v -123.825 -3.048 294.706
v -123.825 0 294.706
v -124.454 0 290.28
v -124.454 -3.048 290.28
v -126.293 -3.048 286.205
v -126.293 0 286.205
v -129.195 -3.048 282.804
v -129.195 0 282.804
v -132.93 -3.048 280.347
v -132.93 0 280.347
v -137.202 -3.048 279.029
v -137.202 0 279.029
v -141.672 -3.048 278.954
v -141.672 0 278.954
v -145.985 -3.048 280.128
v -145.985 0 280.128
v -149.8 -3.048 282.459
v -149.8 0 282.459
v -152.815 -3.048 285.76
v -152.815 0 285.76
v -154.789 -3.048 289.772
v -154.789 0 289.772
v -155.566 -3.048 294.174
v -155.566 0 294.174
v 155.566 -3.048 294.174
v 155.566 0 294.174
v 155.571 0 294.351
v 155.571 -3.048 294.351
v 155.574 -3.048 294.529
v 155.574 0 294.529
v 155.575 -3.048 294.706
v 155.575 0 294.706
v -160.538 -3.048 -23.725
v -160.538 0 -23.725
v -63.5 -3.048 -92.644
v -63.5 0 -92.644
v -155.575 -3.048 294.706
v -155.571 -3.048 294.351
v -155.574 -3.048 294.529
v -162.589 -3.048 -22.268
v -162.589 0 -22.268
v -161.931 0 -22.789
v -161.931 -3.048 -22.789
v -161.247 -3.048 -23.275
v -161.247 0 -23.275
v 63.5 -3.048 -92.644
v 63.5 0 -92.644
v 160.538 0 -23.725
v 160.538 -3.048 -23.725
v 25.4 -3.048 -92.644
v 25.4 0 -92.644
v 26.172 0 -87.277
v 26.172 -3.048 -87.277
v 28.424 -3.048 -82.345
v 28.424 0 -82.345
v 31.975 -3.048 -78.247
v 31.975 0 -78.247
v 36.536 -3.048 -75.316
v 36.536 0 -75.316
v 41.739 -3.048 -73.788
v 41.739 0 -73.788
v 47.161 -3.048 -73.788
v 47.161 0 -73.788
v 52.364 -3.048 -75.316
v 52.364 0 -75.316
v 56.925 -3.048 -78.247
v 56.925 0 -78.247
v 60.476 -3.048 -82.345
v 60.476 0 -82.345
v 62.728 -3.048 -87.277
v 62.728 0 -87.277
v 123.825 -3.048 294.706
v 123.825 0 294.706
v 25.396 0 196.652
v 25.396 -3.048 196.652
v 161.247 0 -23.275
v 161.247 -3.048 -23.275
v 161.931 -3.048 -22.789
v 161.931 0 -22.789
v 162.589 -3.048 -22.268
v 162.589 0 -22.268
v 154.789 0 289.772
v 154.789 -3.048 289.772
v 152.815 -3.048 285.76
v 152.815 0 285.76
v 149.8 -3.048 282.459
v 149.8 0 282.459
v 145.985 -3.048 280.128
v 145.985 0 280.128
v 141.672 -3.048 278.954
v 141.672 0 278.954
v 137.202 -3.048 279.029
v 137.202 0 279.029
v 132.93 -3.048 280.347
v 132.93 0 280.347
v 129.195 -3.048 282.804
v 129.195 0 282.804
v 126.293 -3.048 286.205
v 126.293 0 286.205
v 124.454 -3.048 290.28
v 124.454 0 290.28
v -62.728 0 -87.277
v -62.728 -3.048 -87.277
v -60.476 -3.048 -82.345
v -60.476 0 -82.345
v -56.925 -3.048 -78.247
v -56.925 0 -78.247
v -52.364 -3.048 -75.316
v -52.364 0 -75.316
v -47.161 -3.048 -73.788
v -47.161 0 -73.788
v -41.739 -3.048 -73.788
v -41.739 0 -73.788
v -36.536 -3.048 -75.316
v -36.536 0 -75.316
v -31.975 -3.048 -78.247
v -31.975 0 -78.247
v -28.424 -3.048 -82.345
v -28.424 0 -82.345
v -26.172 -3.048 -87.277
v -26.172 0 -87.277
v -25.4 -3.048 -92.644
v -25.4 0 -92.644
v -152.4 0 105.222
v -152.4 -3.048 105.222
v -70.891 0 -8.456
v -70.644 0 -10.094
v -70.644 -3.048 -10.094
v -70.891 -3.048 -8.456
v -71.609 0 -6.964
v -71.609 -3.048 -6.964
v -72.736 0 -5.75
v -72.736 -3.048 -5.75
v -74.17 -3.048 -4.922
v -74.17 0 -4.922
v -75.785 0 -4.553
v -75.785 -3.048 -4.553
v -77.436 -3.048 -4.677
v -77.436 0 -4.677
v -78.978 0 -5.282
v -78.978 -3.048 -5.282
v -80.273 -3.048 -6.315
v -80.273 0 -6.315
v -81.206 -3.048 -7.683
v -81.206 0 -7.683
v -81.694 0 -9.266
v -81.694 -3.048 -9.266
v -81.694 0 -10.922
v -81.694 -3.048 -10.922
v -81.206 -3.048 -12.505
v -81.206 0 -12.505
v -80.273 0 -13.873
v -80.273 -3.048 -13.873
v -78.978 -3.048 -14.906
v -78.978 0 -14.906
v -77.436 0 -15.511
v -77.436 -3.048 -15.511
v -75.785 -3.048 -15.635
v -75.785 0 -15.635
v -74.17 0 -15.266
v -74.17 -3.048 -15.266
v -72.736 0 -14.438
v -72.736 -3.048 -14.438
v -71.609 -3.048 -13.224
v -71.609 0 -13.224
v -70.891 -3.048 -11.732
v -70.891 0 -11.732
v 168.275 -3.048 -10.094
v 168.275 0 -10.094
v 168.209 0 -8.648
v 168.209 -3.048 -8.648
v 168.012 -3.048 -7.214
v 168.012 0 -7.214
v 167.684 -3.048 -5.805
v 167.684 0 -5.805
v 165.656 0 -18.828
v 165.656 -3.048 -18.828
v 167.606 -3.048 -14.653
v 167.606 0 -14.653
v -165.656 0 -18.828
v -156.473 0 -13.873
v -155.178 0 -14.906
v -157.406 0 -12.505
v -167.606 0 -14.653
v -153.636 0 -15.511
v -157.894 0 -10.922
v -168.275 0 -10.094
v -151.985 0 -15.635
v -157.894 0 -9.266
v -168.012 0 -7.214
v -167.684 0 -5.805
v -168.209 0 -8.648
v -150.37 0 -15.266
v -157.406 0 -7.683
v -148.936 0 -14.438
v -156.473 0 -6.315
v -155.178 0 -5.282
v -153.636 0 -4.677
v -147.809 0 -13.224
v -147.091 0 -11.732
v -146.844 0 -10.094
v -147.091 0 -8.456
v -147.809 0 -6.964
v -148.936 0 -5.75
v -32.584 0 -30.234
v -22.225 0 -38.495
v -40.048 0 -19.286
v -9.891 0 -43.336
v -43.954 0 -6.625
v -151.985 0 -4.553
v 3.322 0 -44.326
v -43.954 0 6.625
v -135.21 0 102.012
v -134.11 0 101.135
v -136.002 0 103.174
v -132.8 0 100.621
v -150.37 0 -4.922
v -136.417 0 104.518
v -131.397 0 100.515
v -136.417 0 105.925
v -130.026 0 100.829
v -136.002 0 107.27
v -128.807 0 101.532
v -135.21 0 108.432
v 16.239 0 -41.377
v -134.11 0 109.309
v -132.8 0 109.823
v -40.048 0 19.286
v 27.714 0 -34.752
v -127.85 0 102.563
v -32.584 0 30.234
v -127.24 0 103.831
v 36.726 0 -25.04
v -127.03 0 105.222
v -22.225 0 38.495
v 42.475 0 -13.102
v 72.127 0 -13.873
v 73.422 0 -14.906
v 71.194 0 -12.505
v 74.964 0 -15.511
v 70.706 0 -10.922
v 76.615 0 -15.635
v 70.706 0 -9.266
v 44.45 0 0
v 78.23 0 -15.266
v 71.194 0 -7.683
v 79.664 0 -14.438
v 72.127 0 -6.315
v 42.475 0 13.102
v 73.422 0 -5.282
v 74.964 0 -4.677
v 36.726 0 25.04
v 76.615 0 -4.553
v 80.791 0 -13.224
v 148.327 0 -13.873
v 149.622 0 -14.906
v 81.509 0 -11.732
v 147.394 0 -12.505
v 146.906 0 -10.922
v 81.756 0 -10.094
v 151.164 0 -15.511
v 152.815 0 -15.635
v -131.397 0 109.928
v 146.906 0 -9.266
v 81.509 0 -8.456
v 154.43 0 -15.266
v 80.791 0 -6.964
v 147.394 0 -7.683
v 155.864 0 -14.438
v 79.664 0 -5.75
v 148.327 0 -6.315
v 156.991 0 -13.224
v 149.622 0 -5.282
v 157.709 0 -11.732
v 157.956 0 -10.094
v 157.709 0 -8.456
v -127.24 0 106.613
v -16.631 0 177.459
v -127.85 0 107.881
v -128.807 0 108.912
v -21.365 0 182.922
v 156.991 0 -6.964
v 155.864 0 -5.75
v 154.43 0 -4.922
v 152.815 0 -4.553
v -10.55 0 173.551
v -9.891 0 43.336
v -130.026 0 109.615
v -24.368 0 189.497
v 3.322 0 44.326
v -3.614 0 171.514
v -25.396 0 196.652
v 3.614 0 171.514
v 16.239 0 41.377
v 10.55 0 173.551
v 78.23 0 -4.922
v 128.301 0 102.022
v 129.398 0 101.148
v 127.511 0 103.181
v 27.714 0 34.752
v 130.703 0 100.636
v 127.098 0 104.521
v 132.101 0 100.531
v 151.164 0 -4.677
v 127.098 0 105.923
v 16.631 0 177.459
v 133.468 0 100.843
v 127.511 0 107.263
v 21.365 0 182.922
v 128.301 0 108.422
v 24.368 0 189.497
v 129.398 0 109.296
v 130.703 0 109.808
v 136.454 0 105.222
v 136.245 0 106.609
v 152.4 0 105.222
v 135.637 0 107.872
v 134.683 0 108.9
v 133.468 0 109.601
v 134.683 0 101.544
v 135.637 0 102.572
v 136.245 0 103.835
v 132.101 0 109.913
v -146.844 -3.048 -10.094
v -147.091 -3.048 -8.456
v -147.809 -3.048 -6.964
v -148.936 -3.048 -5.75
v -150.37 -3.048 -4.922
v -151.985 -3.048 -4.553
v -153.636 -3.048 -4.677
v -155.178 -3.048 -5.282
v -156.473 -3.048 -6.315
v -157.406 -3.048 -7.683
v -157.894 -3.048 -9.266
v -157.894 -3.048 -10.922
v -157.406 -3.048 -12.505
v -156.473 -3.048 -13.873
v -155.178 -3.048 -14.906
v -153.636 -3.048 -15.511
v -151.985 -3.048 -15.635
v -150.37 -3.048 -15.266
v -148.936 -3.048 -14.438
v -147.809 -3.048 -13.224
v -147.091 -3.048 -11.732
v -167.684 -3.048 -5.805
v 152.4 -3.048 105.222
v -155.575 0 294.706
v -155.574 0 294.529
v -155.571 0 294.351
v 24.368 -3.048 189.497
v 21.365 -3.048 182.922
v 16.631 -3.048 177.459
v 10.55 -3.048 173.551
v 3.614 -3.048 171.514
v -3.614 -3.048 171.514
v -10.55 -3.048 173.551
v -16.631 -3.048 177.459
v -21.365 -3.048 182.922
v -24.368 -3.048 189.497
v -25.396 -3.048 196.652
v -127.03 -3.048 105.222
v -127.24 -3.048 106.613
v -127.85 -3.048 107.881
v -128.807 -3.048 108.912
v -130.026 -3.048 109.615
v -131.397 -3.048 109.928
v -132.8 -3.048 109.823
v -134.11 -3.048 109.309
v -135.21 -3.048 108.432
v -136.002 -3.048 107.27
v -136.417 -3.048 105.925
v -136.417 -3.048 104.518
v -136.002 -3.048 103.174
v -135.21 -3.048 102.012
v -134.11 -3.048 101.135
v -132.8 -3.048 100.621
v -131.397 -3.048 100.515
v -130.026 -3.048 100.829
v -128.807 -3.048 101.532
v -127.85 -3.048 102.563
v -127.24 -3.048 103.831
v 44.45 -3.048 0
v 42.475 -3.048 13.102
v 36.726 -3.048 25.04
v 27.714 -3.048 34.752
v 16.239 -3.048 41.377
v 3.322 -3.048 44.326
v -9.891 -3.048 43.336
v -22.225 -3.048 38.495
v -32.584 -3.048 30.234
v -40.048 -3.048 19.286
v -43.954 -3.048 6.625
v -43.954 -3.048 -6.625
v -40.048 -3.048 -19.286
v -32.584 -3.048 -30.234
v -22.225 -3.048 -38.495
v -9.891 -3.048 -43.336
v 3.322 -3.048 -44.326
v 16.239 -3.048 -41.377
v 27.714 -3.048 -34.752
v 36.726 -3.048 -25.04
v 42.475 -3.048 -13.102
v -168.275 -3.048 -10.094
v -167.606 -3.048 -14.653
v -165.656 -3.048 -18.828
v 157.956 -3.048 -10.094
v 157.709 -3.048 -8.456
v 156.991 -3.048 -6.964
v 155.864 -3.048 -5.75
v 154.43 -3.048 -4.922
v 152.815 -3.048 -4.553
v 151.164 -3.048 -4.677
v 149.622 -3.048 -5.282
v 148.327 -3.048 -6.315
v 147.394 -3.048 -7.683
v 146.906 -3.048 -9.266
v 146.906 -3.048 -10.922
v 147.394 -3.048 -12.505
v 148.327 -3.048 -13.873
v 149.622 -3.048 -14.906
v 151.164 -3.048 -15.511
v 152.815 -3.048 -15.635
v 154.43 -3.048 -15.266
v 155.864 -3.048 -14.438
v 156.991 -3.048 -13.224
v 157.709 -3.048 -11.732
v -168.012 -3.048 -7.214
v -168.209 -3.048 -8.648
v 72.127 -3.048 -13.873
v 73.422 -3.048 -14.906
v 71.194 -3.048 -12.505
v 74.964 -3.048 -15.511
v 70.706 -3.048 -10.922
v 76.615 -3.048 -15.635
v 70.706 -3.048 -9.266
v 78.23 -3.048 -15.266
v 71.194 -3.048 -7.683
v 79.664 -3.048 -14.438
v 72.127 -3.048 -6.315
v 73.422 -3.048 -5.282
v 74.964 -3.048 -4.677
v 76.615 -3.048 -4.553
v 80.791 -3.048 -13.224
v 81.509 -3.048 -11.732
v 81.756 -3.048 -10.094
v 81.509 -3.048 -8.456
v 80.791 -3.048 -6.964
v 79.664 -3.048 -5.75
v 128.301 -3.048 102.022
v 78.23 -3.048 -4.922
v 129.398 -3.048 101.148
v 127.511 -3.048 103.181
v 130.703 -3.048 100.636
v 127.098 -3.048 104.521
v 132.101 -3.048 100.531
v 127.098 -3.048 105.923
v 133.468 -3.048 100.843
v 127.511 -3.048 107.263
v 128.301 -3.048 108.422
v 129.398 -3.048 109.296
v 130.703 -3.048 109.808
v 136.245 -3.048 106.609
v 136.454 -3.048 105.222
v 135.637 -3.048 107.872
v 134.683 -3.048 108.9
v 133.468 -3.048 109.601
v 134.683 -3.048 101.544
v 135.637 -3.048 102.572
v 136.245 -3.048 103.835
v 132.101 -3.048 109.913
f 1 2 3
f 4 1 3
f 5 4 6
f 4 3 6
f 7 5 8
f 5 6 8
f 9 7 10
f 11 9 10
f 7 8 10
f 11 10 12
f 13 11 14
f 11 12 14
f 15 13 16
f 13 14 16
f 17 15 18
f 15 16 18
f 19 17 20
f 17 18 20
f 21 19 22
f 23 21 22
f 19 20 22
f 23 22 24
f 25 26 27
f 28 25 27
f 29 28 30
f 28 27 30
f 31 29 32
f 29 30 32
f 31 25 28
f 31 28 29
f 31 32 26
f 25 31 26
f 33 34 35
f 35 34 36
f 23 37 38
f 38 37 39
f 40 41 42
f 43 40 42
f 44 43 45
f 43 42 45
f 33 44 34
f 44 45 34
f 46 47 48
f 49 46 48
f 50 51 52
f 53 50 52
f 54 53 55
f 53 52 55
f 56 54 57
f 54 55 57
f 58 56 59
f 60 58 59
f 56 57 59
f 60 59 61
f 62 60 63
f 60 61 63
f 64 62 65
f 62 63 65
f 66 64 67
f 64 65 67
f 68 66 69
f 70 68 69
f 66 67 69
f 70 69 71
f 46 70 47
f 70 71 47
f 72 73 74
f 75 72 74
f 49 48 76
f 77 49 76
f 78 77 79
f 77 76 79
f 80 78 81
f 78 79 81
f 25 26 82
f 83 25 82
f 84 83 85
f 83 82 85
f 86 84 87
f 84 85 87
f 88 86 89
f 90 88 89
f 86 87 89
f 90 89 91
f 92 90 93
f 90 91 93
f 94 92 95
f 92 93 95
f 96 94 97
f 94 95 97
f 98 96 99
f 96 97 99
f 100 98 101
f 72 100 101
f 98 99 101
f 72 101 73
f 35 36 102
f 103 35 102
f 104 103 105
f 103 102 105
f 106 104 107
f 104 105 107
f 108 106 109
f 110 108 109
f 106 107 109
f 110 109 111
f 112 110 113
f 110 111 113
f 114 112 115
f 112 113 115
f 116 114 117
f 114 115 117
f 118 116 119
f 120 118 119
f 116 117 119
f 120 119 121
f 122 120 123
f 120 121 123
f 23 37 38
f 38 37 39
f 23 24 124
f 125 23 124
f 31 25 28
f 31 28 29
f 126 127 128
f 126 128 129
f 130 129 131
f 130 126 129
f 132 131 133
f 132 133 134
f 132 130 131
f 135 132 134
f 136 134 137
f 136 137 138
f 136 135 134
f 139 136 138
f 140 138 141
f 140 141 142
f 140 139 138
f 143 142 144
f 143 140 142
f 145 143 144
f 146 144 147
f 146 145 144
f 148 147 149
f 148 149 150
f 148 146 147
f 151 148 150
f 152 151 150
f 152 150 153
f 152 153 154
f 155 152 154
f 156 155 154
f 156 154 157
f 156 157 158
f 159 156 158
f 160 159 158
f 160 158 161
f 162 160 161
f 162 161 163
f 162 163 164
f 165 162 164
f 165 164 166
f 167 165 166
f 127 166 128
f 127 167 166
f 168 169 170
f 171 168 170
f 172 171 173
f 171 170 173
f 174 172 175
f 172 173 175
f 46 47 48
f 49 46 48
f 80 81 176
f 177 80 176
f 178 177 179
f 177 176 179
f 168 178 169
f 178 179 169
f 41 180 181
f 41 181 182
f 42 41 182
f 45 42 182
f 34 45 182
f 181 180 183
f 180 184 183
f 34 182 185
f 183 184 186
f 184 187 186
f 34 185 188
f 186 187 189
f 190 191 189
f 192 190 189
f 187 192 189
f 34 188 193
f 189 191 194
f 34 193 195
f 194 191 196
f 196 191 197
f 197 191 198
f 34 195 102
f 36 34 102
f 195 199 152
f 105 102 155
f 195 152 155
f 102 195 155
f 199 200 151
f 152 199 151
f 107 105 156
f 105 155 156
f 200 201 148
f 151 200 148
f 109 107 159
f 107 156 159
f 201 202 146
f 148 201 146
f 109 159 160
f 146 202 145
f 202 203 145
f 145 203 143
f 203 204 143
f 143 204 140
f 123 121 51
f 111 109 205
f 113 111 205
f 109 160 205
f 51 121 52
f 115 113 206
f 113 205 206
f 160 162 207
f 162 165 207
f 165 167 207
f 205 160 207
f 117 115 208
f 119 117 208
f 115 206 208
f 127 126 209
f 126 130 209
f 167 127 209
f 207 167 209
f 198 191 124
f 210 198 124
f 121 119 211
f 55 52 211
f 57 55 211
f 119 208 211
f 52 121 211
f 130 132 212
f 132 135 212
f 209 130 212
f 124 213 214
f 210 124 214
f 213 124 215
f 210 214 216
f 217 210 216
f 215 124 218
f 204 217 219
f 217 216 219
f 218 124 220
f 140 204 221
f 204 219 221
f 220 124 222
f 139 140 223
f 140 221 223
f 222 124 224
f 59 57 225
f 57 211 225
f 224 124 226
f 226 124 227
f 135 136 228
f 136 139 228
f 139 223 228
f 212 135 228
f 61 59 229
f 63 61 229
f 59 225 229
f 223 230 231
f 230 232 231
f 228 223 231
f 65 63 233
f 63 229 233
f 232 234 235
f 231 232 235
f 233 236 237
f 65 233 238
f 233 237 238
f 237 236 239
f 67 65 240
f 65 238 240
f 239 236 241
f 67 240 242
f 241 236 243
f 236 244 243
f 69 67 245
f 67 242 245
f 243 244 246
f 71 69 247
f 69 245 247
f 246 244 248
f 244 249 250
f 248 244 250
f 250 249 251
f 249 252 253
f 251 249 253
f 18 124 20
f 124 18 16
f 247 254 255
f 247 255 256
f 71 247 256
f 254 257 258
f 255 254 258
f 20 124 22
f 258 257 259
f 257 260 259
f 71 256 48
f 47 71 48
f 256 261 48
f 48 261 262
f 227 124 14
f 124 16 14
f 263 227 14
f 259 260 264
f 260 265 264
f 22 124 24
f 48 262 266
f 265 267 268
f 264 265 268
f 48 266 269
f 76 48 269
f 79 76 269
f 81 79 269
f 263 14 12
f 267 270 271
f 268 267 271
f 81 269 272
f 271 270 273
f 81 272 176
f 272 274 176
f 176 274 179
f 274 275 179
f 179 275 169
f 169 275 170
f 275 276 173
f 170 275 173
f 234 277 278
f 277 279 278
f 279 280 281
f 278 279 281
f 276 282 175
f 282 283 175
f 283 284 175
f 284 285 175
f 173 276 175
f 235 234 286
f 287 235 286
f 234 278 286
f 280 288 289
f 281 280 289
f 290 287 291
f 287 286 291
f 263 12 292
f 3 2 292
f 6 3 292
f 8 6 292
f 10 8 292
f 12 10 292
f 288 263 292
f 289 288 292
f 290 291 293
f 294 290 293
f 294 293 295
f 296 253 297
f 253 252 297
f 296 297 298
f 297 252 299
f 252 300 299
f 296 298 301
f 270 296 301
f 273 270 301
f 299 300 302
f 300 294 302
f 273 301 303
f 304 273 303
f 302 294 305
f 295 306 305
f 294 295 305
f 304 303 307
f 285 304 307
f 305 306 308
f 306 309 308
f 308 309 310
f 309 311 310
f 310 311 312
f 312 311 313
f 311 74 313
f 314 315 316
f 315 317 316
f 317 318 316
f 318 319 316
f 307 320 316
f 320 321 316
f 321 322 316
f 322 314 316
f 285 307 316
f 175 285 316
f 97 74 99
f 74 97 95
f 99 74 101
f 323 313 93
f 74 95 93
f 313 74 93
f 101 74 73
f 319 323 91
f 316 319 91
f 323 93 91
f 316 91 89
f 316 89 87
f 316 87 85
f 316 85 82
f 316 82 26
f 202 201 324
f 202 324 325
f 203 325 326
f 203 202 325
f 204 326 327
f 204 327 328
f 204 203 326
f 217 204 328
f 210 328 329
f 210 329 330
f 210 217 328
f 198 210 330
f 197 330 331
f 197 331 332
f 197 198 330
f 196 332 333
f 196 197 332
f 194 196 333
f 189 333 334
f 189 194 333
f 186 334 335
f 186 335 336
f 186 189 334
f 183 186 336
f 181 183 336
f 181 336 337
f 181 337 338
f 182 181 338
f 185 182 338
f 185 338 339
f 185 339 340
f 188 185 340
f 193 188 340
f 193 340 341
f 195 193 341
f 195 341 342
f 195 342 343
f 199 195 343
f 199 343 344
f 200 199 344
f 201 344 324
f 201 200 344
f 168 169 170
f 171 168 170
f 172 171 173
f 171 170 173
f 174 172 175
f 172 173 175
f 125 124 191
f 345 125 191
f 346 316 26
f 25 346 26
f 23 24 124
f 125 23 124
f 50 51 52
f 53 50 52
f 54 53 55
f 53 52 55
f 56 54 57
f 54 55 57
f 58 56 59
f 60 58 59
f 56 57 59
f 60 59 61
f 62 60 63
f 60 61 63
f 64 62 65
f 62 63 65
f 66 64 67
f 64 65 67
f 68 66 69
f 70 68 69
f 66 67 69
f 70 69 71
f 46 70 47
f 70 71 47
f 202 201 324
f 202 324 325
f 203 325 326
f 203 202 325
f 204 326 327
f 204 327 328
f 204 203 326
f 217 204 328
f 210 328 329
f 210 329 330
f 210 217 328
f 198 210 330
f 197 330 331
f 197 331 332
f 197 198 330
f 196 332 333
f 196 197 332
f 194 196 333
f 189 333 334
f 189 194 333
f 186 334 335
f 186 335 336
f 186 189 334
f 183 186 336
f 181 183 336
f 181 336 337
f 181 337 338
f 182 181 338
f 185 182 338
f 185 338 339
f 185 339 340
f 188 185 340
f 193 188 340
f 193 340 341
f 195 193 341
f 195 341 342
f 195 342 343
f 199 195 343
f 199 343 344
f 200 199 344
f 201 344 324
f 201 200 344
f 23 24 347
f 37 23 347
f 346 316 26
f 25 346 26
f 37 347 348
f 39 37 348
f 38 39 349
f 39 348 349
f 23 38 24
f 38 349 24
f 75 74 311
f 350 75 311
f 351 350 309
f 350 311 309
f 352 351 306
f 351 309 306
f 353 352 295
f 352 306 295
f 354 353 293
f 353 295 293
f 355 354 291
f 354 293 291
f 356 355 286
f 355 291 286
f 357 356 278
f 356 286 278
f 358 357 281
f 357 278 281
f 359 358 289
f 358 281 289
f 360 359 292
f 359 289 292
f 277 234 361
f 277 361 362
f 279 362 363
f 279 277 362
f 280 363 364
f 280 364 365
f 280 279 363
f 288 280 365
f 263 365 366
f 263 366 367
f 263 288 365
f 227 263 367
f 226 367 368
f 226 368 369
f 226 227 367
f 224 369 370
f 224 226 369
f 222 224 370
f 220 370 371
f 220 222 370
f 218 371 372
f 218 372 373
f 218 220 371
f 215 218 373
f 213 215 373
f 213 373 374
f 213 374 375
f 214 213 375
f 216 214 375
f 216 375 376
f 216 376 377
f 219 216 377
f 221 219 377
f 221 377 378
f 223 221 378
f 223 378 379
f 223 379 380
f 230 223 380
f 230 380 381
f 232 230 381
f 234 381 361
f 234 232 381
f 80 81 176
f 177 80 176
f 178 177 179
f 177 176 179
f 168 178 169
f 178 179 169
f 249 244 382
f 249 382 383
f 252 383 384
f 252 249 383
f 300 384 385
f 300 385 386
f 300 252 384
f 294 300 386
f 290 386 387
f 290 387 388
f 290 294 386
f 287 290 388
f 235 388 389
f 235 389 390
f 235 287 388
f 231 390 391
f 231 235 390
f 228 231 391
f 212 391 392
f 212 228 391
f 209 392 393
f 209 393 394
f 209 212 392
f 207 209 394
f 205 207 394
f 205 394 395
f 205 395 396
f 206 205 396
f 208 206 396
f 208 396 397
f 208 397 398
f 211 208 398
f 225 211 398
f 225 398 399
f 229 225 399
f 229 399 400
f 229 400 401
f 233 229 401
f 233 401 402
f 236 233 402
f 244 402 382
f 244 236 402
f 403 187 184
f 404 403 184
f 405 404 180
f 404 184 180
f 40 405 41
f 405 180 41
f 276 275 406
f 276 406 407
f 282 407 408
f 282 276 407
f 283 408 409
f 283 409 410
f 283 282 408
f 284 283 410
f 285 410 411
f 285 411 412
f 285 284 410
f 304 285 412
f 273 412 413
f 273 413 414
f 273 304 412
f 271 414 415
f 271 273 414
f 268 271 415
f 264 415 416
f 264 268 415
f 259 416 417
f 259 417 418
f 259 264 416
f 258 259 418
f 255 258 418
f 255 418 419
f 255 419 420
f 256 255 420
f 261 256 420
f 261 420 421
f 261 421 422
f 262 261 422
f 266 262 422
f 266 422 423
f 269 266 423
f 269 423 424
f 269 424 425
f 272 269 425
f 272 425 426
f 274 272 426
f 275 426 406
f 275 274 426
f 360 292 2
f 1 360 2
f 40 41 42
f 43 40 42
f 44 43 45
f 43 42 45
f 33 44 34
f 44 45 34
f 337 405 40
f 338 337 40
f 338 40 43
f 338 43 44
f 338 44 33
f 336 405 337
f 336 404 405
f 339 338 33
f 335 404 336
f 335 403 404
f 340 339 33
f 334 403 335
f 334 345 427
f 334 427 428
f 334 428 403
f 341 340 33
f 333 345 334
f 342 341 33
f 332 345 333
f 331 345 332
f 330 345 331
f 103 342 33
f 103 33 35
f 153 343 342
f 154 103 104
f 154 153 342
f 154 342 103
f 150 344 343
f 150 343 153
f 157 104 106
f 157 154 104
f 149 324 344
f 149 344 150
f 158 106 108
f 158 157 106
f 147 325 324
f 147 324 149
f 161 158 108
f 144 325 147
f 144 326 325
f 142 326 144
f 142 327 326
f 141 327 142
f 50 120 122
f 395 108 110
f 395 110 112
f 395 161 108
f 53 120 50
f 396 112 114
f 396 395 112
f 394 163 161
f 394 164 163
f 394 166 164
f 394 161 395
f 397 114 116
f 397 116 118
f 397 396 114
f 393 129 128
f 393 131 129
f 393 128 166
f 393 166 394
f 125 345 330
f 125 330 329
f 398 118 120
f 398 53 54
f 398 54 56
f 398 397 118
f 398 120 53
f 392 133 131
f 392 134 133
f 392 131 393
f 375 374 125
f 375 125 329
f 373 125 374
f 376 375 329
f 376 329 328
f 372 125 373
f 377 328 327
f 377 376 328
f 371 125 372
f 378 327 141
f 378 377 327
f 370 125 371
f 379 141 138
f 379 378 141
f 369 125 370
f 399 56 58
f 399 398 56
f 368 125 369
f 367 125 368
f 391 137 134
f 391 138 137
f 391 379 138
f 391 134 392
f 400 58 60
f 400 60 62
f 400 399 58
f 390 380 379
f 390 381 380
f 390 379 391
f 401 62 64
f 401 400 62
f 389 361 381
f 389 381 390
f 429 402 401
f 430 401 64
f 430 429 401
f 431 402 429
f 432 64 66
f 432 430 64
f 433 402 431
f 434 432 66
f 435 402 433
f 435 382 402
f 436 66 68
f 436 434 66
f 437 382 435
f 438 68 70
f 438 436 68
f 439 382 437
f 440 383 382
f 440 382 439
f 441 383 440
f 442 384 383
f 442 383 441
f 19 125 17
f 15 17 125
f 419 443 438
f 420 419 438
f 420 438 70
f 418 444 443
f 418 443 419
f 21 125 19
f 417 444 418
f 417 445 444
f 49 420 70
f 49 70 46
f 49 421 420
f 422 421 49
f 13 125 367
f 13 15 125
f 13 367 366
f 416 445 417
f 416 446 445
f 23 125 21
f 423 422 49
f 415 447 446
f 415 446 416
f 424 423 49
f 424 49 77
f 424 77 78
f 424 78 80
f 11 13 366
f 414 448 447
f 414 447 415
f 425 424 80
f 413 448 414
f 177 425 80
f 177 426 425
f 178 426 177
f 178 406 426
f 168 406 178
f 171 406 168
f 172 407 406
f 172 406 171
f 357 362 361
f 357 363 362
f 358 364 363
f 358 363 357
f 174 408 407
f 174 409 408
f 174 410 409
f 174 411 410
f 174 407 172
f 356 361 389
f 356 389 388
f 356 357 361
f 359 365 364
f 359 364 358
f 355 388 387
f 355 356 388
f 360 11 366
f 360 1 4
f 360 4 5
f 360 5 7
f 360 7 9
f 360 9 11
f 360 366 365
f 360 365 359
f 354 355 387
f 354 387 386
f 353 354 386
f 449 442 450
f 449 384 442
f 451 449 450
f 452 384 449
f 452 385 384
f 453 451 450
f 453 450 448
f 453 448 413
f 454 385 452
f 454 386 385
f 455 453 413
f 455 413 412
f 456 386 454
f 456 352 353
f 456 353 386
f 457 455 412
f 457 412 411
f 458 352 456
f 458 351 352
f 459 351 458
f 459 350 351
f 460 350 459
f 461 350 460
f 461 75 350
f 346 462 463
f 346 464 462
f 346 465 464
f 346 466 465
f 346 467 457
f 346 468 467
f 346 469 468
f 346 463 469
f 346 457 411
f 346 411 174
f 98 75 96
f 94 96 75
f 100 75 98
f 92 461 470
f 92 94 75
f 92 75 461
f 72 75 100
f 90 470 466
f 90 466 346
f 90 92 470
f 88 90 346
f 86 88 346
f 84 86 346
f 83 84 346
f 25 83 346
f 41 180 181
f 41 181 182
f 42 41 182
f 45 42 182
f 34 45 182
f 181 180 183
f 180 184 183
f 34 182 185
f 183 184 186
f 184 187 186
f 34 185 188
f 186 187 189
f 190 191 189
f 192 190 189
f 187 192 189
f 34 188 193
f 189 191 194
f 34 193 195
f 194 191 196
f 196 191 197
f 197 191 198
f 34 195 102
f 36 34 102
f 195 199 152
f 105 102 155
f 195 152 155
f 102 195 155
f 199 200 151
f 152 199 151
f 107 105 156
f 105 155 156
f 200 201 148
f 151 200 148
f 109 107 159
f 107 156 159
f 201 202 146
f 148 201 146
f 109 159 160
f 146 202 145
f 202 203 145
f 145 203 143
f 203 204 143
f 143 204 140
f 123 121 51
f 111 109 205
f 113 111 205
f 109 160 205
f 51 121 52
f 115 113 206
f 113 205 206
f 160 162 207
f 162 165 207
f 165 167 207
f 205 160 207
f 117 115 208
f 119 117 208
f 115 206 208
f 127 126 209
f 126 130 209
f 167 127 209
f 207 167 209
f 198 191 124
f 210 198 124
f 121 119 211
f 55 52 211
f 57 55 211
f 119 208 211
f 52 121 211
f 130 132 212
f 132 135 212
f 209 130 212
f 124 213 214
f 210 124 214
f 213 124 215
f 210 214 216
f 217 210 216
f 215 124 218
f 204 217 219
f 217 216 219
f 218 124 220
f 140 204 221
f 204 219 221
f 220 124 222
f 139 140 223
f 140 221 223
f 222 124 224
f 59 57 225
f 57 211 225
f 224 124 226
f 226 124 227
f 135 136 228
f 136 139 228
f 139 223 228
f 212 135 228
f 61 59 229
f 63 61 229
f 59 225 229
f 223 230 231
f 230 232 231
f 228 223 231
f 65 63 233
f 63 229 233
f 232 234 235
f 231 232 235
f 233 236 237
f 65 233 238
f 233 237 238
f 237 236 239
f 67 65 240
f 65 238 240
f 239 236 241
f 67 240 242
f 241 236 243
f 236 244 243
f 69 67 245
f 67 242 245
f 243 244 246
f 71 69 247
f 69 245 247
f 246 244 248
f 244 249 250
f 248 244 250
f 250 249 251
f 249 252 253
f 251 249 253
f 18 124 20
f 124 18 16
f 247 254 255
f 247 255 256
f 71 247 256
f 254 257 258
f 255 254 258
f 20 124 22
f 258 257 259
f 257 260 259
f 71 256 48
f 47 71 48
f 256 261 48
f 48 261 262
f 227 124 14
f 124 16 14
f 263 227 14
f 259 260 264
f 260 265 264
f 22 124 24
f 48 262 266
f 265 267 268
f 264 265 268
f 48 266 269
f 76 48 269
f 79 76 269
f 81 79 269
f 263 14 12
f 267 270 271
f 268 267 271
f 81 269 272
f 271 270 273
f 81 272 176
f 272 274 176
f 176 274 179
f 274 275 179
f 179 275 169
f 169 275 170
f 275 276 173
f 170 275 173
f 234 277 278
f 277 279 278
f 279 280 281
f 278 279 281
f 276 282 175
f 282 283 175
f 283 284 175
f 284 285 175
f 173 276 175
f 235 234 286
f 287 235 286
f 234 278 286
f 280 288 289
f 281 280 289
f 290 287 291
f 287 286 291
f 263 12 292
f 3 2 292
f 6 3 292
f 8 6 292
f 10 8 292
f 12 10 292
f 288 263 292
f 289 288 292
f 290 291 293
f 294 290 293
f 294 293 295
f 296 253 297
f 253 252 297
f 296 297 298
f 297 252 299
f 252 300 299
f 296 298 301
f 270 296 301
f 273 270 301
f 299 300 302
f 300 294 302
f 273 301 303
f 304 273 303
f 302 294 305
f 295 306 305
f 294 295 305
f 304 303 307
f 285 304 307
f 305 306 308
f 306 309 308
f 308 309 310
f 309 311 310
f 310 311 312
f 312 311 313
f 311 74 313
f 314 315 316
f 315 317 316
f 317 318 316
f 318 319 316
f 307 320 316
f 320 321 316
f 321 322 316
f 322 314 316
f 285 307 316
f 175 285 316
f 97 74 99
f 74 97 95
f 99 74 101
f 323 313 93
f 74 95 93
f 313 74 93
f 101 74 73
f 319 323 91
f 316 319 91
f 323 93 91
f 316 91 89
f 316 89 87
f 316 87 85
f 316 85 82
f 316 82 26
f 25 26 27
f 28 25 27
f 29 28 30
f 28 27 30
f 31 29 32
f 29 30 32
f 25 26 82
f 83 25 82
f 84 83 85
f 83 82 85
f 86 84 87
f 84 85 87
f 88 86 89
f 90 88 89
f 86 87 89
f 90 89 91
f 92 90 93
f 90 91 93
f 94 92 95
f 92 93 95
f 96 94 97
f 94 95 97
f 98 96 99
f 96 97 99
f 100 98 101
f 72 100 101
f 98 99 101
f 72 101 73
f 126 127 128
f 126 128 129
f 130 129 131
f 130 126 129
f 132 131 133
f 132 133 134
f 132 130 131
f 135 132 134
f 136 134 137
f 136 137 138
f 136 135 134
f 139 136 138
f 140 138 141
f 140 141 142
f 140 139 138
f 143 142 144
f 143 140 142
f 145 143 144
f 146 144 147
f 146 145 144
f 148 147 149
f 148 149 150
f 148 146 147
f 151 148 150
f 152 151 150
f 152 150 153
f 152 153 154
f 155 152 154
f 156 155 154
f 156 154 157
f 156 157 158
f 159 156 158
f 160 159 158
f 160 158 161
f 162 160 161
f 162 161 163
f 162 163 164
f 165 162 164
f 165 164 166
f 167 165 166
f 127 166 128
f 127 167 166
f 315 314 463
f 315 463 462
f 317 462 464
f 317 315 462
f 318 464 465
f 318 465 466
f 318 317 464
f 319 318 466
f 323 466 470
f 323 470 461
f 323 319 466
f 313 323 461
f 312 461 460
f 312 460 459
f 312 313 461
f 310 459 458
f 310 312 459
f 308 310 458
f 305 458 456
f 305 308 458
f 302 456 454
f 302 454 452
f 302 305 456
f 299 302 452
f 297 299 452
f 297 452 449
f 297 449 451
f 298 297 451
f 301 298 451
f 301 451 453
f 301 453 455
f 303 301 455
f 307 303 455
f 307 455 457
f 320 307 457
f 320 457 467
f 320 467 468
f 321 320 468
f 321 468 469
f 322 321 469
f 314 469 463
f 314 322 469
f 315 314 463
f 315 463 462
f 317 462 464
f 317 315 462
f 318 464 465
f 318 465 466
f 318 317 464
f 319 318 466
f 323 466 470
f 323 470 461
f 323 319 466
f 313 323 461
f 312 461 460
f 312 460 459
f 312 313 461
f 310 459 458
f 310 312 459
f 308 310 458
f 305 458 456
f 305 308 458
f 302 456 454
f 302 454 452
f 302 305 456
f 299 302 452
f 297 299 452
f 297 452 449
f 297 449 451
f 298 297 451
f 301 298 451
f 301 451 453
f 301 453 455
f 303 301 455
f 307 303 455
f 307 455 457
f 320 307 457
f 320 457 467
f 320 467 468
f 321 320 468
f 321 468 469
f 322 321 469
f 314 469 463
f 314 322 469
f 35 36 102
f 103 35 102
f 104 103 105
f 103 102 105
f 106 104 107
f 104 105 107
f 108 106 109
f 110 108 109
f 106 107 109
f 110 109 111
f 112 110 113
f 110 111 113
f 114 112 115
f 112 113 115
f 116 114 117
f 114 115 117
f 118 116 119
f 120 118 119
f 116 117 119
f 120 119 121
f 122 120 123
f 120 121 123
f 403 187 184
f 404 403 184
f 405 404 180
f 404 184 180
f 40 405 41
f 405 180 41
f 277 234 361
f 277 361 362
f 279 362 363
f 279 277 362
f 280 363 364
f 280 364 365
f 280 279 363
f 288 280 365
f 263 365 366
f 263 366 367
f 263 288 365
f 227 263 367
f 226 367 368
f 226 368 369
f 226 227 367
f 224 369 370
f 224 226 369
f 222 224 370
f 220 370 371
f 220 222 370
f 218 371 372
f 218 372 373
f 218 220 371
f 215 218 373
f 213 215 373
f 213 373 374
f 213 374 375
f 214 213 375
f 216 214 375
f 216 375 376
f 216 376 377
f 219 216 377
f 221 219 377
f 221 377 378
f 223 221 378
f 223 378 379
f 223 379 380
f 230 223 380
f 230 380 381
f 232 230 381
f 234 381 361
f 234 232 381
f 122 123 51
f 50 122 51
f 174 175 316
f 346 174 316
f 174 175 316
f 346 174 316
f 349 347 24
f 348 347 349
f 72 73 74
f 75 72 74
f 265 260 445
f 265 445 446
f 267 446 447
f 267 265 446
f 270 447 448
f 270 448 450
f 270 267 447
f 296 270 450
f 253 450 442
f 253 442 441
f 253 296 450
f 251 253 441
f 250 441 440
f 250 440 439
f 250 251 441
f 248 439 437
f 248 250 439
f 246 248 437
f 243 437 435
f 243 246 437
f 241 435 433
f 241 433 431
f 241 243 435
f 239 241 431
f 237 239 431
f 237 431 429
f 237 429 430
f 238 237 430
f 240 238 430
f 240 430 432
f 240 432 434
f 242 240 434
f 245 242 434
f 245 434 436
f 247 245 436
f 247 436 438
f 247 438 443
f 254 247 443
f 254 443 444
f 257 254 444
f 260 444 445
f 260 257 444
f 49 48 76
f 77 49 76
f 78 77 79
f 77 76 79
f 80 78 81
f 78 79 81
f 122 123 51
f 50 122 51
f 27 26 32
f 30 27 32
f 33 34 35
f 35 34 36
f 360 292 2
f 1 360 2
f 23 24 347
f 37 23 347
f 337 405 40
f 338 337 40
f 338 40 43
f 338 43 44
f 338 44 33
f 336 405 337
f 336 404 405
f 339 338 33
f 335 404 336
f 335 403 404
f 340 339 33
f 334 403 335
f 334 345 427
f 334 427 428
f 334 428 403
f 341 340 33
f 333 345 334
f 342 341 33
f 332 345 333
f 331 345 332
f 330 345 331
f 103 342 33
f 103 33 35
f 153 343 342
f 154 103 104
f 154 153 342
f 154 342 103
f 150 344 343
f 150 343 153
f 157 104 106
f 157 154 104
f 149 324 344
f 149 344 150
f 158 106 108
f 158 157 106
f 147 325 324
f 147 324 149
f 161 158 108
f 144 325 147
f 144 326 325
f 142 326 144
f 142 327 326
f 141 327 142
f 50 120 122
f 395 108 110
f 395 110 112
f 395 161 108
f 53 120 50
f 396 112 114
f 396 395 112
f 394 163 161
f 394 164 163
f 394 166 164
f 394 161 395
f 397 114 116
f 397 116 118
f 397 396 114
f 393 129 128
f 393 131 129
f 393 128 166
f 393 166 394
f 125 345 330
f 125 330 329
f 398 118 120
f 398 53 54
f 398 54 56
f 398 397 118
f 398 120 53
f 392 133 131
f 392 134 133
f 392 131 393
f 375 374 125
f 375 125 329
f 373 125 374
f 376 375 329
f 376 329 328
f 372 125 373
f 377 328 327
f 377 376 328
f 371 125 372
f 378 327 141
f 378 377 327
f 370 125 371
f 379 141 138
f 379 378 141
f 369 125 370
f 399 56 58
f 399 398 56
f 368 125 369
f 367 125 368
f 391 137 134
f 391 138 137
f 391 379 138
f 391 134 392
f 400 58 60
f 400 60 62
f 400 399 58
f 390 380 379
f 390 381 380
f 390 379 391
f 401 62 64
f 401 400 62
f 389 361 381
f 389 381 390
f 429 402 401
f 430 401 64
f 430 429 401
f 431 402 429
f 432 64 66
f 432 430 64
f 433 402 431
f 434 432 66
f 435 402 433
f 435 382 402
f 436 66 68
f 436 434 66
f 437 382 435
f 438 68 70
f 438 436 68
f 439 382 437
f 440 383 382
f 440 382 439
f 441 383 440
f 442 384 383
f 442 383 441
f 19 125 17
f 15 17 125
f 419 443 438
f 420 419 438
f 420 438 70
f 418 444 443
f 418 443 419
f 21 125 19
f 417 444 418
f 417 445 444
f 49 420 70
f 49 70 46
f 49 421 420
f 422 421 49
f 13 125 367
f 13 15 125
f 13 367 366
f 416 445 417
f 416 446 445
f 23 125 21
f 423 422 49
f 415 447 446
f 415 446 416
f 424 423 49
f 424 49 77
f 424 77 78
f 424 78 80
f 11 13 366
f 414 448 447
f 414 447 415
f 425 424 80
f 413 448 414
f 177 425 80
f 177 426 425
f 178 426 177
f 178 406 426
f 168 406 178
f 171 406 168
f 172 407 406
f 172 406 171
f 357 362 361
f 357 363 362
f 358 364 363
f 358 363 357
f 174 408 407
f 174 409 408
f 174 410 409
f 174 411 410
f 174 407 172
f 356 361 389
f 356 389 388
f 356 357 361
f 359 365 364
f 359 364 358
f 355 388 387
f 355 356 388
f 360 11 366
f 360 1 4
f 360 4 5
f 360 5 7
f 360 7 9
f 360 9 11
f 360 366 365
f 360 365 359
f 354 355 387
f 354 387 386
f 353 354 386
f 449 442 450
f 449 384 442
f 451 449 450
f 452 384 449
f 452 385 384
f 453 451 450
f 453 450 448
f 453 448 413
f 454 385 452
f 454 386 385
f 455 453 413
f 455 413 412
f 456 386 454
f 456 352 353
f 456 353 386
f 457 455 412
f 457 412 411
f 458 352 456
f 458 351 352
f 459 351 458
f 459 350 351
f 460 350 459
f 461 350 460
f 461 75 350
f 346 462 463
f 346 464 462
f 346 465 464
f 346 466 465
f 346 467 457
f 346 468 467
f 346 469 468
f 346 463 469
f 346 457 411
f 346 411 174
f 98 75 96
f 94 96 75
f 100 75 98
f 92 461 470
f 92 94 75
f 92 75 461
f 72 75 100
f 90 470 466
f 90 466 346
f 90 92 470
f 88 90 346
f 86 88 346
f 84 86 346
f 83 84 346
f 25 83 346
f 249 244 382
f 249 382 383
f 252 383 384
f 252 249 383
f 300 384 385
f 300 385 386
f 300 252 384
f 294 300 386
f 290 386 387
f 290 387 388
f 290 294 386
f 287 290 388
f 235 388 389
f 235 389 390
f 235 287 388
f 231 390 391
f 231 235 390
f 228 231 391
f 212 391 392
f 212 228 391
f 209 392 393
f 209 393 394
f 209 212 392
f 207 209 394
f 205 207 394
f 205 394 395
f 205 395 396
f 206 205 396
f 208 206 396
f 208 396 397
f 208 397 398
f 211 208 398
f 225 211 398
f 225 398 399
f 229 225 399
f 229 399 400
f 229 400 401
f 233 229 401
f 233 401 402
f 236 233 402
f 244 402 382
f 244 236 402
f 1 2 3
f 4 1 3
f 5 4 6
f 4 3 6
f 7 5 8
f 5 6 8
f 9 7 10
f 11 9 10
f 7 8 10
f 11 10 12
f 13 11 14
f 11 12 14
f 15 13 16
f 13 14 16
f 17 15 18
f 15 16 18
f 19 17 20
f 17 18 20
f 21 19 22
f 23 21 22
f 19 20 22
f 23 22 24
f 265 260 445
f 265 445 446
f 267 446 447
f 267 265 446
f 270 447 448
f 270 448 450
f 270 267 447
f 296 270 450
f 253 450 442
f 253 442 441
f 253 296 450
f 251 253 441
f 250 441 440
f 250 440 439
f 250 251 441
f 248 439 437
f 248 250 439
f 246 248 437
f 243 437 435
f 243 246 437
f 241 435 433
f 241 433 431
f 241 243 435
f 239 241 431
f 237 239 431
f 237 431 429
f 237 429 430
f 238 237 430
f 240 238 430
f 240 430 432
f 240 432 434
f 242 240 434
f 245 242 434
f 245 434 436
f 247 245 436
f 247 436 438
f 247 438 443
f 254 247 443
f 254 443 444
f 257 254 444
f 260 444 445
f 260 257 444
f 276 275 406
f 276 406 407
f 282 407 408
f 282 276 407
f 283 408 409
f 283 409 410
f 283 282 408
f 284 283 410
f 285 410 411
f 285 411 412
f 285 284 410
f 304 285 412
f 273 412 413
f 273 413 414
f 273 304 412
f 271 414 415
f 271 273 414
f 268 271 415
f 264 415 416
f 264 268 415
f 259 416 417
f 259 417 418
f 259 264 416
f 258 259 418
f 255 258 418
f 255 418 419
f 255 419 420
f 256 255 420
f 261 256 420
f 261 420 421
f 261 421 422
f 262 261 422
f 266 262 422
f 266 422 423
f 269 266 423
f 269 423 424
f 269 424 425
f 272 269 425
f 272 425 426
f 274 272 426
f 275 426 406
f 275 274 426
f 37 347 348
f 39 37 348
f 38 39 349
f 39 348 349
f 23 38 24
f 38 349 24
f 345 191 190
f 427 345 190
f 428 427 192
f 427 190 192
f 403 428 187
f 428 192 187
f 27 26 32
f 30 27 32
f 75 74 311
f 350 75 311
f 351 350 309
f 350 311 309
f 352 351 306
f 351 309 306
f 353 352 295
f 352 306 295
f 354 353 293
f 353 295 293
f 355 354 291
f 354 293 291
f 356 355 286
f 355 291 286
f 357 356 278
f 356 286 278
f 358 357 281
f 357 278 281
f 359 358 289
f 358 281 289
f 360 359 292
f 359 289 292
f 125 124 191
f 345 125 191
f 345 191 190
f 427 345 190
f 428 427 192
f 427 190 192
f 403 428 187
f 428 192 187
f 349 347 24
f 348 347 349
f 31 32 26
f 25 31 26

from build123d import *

# Parameters (mm, degrees)
F0_R     = 5.55625
F0_R_2   = 44.45
F0_R_3   = 4.719662
F0_R_4   = 4.704253
F1_DEPTH = 3.048
F2_DEPTH = 3.048


with BuildPart() as f1:
    # F0 (on Front) → F1 (new body)
    with BuildSketch(Plane.XZ):
        with BuildLine():
            ThreePointArc((-155.575, 294.705913), (-155.572772, 294.439949), (-155.566088, 294.174059))
            Line((-155.566088, 294.174059), (-155.575, 294.705913))
        make_face()
        with BuildLine():
            Line((155.575, 294.705913), (155.566088, 294.174059))
            ThreePointArc((155.566088, 294.174059), (155.572772, 294.439949), (155.575, 294.705913))
        make_face()
        with BuildLine():
            ThreePointArc((-63.5, -92.644087), (-44.45, -73.594087), (-25.4, -92.644087))
            Line((-25.4, -92.644087), (25.4, -92.644087))
            ThreePointArc((25.4, -92.644087), (44.45, -73.594087), (63.5, -92.644087))
            Line((63.5, -92.644087), (160.537703, -23.724692))
            Line((160.537703, -23.724692), (162.58925, -22.267616))
            ThreePointArc((162.58925, -22.267616), (166.783497, -16.812021), (168.275, -10.094087))
            Line((168.275, -10.094087), (167.684475, -5.804511))
            Line((167.684475, -5.804511), (152.4, 105.221913))
            Line((152.4, 105.221913), (155.566088, 294.174059))
            ThreePointArc((155.566088, 294.174059), (139.434035, 278.833141), (123.825, 294.705913))
            Line((123.825, 294.705913), (25.396428, 196.652323))
            ThreePointArc((25.396428, 196.652323), (0, 171.255895), (-25.396428, 196.652323))
            Line((-25.396428, 196.652323), (-123.825, 294.705913))
            ThreePointArc((-123.825, 294.705913), (-139.434035, 278.833141), (-155.566088, 294.174059))
            Line((-155.566088, 294.174059), (-152.4, 105.221913))
            Line((-152.4, 105.221913), (-167.684475, -5.804511))
            Line((-167.684475, -5.804511), (-168.275, -10.094087))
            ThreePointArc((-168.275, -10.094087), (-166.783497, -16.812021), (-162.58925, -22.267616))
            Line((-162.58925, -22.267616), (-160.537703, -23.724692))
            Line((-160.537703, -23.724692), (-63.5, -92.644087))
        make_face()
        with Locations((-152.4, -10.094087)):
            Circle(F0_R, mode=Mode.SUBTRACT)
        with Locations((-76.2, -10.094087)):
            Circle(F0_R, mode=Mode.SUBTRACT)
        Circle(F0_R_2, mode=Mode.SUBTRACT)
        with Locations((76.2, -10.094087)):
            Circle(F0_R, mode=Mode.SUBTRACT)
        with Locations((152.4, -10.094087)):
            Circle(F0_R, mode=Mode.SUBTRACT)
        with Locations((-131.7498, 105.221913)):
            Circle(F0_R_3, mode=Mode.SUBTRACT)
        with Locations((131.7498, 105.221913)):
            Circle(F0_R_4, mode=Mode.SUBTRACT)
        with BuildLine():
            ThreePointArc((-162.58925, -22.267616), (-161.592392, -23.036867), (-160.537703, -23.724692))
            Line((-160.537703, -23.724692), (-162.58925, -22.267616))
        make_face()
        with BuildLine():
            Line((162.58925, -22.267616), (160.537703, -23.724692))
            ThreePointArc((160.537703, -23.724692), (161.592392, -23.036867), (162.58925, -22.267616))
        make_face()
        with BuildLine():
            ThreePointArc((-167.684475, -5.804511), (-168.126676, -7.929071), (-168.275, -10.094087))
            Line((-168.275, -10.094087), (-167.684475, -5.804511))
        make_face()
        with BuildLine():
            Line((167.684475, -5.804511), (168.275, -10.094087))
            ThreePointArc((168.275, -10.094087), (168.126676, -7.929071), (167.684475, -5.804511))
        make_face()
    extrude(amount=F1_DEPTH)


with BuildPart() as f2:
    # F0 (on Front) → F2 (new body)
    with BuildSketch(Plane.XZ):
        with BuildLine():
            ThreePointArc((-155.575, 294.705913), (-155.572772, 294.439949), (-155.566088, 294.174059))
            Line((-155.566088, 294.174059), (-155.575, 294.705913))
        make_face()
        with BuildLine():
            Line((155.575, 294.705913), (155.566088, 294.174059))
            ThreePointArc((155.566088, 294.174059), (155.572772, 294.439949), (155.575, 294.705913))
        make_face()
        with BuildLine():
            ThreePointArc((-63.5, -92.644087), (-44.45, -73.594087), (-25.4, -92.644087))
            Line((-25.4, -92.644087), (25.4, -92.644087))
            ThreePointArc((25.4, -92.644087), (44.45, -73.594087), (63.5, -92.644087))
            Line((63.5, -92.644087), (160.537703, -23.724692))
            Line((160.537703, -23.724692), (162.58925, -22.267616))
            ThreePointArc((162.58925, -22.267616), (166.783497, -16.812021), (168.275, -10.094087))
            Line((168.275, -10.094087), (167.684475, -5.804511))
            Line((167.684475, -5.804511), (152.4, 105.221913))
            Line((152.4, 105.221913), (155.566088, 294.174059))
            ThreePointArc((155.566088, 294.174059), (139.434035, 278.833141), (123.825, 294.705913))
            Line((123.825, 294.705913), (25.396428, 196.652323))
            ThreePointArc((25.396428, 196.652323), (0, 171.255895), (-25.396428, 196.652323))
            Line((-25.396428, 196.652323), (-123.825, 294.705913))
            ThreePointArc((-123.825, 294.705913), (-139.434035, 278.833141), (-155.566088, 294.174059))
            Line((-155.566088, 294.174059), (-152.4, 105.221913))
            Line((-152.4, 105.221913), (-167.684475, -5.804511))
            Line((-167.684475, -5.804511), (-168.275, -10.094087))
            ThreePointArc((-168.275, -10.094087), (-166.783497, -16.812021), (-162.58925, -22.267616))
            Line((-162.58925, -22.267616), (-160.537703, -23.724692))
            Line((-160.537703, -23.724692), (-63.5, -92.644087))
        make_face()
        with Locations((-152.4, -10.094087)):
            Circle(F0_R, mode=Mode.SUBTRACT)
        with Locations((-76.2, -10.094087)):
            Circle(F0_R, mode=Mode.SUBTRACT)
        Circle(F0_R_2, mode=Mode.SUBTRACT)
        with Locations((76.2, -10.094087)):
            Circle(F0_R, mode=Mode.SUBTRACT)
        with Locations((152.4, -10.094087)):
            Circle(F0_R, mode=Mode.SUBTRACT)
        with Locations((-131.7498, 105.221913)):
            Circle(F0_R_3, mode=Mode.SUBTRACT)
        with Locations((131.7498, 105.221913)):
            Circle(F0_R_4, mode=Mode.SUBTRACT)
        with BuildLine():
            ThreePointArc((-162.58925, -22.267616), (-161.592392, -23.036867), (-160.537703, -23.724692))
            Line((-160.537703, -23.724692), (-162.58925, -22.267616))
        make_face()
        with BuildLine():
            Line((162.58925, -22.267616), (160.537703, -23.724692))
            ThreePointArc((160.537703, -23.724692), (161.592392, -23.036867), (162.58925, -22.267616))
        make_face()
        with BuildLine():
            ThreePointArc((-167.684475, -5.804511), (-168.126676, -7.929071), (-168.275, -10.094087))
            Line((-168.275, -10.094087), (-167.684475, -5.804511))
        make_face()
        with BuildLine():
            Line((167.684475, -5.804511), (168.275, -10.094087))
            ThreePointArc((168.275, -10.094087), (168.126676, -7.929071), (167.684475, -5.804511))
        make_face()
    extrude(amount=F2_DEPTH)


solid = Compound([f1.part, f2.part])
